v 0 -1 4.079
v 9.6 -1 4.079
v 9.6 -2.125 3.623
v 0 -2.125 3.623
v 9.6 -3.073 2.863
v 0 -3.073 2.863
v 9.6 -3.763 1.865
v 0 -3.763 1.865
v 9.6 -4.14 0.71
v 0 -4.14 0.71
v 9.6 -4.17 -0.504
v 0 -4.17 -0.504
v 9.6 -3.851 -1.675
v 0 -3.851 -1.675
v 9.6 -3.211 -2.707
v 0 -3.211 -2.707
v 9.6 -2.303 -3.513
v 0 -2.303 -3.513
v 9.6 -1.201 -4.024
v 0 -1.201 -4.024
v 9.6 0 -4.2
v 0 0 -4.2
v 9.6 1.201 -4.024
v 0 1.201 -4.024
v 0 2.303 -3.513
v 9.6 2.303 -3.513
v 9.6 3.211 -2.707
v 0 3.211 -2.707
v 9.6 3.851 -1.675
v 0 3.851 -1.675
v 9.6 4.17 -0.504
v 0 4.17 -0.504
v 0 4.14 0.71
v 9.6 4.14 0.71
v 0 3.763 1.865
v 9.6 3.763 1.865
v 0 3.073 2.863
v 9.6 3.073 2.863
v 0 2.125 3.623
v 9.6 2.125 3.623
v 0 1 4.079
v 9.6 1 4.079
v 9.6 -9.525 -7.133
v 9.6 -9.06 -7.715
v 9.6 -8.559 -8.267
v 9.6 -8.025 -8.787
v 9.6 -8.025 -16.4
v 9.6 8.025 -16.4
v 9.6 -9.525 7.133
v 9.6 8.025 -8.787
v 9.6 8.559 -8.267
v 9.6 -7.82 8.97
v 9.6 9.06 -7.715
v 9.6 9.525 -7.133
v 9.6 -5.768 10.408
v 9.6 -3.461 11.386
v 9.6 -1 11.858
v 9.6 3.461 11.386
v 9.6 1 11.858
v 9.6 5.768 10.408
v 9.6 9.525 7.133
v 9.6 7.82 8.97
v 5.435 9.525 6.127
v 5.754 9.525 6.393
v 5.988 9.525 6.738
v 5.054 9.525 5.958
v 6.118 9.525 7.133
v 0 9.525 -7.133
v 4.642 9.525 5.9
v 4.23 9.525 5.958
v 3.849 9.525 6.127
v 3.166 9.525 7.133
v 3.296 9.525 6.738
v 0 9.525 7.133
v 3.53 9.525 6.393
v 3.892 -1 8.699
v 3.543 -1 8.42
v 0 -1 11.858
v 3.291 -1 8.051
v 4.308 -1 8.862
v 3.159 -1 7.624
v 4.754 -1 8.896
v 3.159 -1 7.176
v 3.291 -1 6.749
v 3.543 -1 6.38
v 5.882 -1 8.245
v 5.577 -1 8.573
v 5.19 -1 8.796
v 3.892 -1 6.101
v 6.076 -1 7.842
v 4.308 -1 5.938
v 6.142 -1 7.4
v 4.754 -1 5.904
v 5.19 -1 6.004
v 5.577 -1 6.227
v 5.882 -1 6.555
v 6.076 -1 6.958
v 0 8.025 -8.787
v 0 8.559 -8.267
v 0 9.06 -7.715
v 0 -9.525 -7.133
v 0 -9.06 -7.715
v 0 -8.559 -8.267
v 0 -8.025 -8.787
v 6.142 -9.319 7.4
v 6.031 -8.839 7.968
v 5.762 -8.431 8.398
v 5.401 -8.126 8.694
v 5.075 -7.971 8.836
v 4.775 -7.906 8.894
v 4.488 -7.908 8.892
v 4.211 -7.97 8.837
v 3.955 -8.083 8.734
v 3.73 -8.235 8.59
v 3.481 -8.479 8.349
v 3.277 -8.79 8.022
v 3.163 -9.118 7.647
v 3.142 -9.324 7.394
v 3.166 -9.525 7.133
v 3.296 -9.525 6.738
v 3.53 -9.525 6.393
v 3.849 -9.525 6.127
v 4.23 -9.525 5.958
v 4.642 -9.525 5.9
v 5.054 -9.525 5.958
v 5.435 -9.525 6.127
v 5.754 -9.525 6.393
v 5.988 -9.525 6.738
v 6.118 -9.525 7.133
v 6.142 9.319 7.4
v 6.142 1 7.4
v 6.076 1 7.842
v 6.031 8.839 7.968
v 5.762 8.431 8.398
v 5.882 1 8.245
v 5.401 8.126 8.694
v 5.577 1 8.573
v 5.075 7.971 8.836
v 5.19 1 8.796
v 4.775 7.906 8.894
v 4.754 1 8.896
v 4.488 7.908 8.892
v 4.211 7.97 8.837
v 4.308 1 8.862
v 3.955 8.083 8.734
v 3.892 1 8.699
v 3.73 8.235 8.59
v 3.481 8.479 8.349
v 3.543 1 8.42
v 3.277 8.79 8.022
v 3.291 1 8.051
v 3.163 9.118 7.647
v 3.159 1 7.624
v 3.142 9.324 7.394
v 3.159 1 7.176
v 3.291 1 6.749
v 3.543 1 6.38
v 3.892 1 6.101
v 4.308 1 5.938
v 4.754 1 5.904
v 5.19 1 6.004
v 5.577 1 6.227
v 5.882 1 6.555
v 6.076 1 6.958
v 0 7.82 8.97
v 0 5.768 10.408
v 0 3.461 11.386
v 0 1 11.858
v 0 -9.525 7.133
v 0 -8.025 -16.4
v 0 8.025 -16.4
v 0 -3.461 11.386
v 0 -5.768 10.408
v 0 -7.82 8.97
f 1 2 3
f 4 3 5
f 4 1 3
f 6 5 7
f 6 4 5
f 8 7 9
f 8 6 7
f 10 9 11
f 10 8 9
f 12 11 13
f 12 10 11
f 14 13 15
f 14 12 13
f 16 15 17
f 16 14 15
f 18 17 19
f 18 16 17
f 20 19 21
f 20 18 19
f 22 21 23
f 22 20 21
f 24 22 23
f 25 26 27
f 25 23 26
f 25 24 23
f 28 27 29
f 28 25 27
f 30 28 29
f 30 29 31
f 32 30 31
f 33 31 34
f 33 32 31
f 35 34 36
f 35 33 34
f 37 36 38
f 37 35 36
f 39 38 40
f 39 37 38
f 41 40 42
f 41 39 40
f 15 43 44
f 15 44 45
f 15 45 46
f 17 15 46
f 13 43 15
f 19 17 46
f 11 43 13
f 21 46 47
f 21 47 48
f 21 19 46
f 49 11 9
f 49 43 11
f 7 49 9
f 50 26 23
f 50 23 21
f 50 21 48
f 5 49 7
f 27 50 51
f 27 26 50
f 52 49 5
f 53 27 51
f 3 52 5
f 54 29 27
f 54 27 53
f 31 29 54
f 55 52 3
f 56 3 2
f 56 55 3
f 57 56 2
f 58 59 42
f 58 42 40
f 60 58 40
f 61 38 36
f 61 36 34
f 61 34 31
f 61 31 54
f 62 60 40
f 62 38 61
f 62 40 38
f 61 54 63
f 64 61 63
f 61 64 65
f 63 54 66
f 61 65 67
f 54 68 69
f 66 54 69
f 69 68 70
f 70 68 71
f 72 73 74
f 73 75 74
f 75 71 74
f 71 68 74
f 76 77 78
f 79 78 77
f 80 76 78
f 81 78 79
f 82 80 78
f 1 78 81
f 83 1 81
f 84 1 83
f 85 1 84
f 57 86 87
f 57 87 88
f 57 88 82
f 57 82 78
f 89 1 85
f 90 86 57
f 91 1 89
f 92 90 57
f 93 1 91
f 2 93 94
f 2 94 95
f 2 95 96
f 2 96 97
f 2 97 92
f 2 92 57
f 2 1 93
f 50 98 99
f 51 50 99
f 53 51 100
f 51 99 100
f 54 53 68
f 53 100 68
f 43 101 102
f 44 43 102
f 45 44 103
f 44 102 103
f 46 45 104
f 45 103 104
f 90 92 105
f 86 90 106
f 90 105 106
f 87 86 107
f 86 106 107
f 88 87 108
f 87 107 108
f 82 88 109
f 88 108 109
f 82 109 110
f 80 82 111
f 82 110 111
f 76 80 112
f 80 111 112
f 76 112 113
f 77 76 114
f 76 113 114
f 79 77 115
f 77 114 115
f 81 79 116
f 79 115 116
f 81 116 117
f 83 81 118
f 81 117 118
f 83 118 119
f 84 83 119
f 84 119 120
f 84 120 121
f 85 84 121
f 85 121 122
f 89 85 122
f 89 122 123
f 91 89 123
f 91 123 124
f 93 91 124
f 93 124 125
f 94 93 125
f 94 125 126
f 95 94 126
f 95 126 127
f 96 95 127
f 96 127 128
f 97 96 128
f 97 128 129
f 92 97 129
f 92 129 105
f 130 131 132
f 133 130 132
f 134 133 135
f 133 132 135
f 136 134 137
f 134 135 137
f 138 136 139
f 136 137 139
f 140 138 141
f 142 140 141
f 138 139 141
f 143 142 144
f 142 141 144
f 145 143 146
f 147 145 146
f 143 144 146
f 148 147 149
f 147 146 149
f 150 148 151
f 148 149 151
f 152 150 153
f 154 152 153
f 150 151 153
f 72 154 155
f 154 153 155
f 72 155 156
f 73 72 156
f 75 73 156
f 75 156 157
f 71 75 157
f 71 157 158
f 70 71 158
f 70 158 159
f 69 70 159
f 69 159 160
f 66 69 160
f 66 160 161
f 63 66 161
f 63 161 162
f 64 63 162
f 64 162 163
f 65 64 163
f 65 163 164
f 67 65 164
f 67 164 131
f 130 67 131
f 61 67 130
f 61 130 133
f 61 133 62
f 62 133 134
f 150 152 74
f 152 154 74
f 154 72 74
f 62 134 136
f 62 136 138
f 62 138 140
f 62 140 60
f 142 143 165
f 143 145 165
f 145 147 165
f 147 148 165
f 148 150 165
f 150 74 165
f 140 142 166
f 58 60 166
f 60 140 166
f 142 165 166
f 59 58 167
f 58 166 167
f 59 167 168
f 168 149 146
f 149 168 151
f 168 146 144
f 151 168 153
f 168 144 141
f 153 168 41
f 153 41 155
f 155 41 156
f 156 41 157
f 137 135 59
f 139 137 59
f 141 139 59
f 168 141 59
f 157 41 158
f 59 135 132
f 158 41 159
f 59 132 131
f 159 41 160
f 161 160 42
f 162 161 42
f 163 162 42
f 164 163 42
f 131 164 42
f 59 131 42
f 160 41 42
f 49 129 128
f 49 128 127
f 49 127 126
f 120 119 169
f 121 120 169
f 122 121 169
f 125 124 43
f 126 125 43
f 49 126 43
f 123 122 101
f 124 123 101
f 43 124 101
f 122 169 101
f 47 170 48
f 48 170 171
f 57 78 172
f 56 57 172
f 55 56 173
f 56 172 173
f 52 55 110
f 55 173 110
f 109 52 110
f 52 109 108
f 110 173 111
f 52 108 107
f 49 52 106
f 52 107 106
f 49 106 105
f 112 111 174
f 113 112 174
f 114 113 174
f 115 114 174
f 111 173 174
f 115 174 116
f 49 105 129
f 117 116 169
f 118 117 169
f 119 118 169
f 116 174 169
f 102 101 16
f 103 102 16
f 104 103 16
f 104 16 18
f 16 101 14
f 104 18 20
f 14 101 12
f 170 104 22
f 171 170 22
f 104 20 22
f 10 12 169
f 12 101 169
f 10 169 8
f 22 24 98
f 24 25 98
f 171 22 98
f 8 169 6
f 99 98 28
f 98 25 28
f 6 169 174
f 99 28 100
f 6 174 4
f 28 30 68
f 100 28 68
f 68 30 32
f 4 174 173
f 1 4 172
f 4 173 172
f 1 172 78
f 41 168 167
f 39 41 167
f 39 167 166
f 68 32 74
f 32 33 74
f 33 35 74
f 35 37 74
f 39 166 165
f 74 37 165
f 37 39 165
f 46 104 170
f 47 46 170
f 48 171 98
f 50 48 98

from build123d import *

# Parameters (mm, degrees)
F0_R     = 4.2
F1_DEPTH = 9.6
F2_R     = 1.5
F3_DEPTH = 19.051
F4_W     = 9.64414
F4_H     = 2
F5_DEPTH = 11.901


with BuildPart() as f1:
    # F0 (on Right) → F1 (new body)
    with BuildSketch(Plane.YZ):
        with BuildLine():
            Line((-9.525, 7.133328), (-9.525, -7.133328))
            ThreePointArc((-9.525, -7.133328), (-8.813863, -7.995362), (-8.025, -8.786887))
            ThreePointArc((-8.025, -8.786887), (0, -11.9), (8.025, -8.786887))
            ThreePointArc((8.025, -8.786887), (8.813863, -7.995362), (9.525, -7.133328))
            Line((9.525, -7.133328), (9.525, 7.133328))
            ThreePointArc((9.525, 7.133328), (0, 11.9), (-9.525, 7.133328))
        make_face()
        Circle(F0_R, mode=Mode.SUBTRACT)
        with BuildLine():
            ThreePointArc((8.025, -8.786887), (0, -11.9), (-8.025, -8.786887))
            Line((-8.025, -8.786887), (-8.025, -16.4))
            Line((-8.025, -16.4), (8.025, -16.4))
            Line((8.025, -16.4), (8.025, -8.786887))
        make_face()
    extrude(amount=F1_DEPTH)

    # F2 (on face) → F3 (cut, through all)
    with BuildSketch(Plane.XZ.offset(9.525)):
        with Locations((4.642159, 7.4)):
            Circle(F2_R)
    extrude(amount=-F3_DEPTH, mode=Mode.SUBTRACT)

    # F4 (on Top) → F5 (cut, through all)
    with BuildSketch(Plane.XY):
        with Locations((4.82207, 0)):
            Rectangle(F4_W, F4_H)
    extrude(amount=F5_DEPTH, mode=Mode.SUBTRACT)


solid = f1.part
